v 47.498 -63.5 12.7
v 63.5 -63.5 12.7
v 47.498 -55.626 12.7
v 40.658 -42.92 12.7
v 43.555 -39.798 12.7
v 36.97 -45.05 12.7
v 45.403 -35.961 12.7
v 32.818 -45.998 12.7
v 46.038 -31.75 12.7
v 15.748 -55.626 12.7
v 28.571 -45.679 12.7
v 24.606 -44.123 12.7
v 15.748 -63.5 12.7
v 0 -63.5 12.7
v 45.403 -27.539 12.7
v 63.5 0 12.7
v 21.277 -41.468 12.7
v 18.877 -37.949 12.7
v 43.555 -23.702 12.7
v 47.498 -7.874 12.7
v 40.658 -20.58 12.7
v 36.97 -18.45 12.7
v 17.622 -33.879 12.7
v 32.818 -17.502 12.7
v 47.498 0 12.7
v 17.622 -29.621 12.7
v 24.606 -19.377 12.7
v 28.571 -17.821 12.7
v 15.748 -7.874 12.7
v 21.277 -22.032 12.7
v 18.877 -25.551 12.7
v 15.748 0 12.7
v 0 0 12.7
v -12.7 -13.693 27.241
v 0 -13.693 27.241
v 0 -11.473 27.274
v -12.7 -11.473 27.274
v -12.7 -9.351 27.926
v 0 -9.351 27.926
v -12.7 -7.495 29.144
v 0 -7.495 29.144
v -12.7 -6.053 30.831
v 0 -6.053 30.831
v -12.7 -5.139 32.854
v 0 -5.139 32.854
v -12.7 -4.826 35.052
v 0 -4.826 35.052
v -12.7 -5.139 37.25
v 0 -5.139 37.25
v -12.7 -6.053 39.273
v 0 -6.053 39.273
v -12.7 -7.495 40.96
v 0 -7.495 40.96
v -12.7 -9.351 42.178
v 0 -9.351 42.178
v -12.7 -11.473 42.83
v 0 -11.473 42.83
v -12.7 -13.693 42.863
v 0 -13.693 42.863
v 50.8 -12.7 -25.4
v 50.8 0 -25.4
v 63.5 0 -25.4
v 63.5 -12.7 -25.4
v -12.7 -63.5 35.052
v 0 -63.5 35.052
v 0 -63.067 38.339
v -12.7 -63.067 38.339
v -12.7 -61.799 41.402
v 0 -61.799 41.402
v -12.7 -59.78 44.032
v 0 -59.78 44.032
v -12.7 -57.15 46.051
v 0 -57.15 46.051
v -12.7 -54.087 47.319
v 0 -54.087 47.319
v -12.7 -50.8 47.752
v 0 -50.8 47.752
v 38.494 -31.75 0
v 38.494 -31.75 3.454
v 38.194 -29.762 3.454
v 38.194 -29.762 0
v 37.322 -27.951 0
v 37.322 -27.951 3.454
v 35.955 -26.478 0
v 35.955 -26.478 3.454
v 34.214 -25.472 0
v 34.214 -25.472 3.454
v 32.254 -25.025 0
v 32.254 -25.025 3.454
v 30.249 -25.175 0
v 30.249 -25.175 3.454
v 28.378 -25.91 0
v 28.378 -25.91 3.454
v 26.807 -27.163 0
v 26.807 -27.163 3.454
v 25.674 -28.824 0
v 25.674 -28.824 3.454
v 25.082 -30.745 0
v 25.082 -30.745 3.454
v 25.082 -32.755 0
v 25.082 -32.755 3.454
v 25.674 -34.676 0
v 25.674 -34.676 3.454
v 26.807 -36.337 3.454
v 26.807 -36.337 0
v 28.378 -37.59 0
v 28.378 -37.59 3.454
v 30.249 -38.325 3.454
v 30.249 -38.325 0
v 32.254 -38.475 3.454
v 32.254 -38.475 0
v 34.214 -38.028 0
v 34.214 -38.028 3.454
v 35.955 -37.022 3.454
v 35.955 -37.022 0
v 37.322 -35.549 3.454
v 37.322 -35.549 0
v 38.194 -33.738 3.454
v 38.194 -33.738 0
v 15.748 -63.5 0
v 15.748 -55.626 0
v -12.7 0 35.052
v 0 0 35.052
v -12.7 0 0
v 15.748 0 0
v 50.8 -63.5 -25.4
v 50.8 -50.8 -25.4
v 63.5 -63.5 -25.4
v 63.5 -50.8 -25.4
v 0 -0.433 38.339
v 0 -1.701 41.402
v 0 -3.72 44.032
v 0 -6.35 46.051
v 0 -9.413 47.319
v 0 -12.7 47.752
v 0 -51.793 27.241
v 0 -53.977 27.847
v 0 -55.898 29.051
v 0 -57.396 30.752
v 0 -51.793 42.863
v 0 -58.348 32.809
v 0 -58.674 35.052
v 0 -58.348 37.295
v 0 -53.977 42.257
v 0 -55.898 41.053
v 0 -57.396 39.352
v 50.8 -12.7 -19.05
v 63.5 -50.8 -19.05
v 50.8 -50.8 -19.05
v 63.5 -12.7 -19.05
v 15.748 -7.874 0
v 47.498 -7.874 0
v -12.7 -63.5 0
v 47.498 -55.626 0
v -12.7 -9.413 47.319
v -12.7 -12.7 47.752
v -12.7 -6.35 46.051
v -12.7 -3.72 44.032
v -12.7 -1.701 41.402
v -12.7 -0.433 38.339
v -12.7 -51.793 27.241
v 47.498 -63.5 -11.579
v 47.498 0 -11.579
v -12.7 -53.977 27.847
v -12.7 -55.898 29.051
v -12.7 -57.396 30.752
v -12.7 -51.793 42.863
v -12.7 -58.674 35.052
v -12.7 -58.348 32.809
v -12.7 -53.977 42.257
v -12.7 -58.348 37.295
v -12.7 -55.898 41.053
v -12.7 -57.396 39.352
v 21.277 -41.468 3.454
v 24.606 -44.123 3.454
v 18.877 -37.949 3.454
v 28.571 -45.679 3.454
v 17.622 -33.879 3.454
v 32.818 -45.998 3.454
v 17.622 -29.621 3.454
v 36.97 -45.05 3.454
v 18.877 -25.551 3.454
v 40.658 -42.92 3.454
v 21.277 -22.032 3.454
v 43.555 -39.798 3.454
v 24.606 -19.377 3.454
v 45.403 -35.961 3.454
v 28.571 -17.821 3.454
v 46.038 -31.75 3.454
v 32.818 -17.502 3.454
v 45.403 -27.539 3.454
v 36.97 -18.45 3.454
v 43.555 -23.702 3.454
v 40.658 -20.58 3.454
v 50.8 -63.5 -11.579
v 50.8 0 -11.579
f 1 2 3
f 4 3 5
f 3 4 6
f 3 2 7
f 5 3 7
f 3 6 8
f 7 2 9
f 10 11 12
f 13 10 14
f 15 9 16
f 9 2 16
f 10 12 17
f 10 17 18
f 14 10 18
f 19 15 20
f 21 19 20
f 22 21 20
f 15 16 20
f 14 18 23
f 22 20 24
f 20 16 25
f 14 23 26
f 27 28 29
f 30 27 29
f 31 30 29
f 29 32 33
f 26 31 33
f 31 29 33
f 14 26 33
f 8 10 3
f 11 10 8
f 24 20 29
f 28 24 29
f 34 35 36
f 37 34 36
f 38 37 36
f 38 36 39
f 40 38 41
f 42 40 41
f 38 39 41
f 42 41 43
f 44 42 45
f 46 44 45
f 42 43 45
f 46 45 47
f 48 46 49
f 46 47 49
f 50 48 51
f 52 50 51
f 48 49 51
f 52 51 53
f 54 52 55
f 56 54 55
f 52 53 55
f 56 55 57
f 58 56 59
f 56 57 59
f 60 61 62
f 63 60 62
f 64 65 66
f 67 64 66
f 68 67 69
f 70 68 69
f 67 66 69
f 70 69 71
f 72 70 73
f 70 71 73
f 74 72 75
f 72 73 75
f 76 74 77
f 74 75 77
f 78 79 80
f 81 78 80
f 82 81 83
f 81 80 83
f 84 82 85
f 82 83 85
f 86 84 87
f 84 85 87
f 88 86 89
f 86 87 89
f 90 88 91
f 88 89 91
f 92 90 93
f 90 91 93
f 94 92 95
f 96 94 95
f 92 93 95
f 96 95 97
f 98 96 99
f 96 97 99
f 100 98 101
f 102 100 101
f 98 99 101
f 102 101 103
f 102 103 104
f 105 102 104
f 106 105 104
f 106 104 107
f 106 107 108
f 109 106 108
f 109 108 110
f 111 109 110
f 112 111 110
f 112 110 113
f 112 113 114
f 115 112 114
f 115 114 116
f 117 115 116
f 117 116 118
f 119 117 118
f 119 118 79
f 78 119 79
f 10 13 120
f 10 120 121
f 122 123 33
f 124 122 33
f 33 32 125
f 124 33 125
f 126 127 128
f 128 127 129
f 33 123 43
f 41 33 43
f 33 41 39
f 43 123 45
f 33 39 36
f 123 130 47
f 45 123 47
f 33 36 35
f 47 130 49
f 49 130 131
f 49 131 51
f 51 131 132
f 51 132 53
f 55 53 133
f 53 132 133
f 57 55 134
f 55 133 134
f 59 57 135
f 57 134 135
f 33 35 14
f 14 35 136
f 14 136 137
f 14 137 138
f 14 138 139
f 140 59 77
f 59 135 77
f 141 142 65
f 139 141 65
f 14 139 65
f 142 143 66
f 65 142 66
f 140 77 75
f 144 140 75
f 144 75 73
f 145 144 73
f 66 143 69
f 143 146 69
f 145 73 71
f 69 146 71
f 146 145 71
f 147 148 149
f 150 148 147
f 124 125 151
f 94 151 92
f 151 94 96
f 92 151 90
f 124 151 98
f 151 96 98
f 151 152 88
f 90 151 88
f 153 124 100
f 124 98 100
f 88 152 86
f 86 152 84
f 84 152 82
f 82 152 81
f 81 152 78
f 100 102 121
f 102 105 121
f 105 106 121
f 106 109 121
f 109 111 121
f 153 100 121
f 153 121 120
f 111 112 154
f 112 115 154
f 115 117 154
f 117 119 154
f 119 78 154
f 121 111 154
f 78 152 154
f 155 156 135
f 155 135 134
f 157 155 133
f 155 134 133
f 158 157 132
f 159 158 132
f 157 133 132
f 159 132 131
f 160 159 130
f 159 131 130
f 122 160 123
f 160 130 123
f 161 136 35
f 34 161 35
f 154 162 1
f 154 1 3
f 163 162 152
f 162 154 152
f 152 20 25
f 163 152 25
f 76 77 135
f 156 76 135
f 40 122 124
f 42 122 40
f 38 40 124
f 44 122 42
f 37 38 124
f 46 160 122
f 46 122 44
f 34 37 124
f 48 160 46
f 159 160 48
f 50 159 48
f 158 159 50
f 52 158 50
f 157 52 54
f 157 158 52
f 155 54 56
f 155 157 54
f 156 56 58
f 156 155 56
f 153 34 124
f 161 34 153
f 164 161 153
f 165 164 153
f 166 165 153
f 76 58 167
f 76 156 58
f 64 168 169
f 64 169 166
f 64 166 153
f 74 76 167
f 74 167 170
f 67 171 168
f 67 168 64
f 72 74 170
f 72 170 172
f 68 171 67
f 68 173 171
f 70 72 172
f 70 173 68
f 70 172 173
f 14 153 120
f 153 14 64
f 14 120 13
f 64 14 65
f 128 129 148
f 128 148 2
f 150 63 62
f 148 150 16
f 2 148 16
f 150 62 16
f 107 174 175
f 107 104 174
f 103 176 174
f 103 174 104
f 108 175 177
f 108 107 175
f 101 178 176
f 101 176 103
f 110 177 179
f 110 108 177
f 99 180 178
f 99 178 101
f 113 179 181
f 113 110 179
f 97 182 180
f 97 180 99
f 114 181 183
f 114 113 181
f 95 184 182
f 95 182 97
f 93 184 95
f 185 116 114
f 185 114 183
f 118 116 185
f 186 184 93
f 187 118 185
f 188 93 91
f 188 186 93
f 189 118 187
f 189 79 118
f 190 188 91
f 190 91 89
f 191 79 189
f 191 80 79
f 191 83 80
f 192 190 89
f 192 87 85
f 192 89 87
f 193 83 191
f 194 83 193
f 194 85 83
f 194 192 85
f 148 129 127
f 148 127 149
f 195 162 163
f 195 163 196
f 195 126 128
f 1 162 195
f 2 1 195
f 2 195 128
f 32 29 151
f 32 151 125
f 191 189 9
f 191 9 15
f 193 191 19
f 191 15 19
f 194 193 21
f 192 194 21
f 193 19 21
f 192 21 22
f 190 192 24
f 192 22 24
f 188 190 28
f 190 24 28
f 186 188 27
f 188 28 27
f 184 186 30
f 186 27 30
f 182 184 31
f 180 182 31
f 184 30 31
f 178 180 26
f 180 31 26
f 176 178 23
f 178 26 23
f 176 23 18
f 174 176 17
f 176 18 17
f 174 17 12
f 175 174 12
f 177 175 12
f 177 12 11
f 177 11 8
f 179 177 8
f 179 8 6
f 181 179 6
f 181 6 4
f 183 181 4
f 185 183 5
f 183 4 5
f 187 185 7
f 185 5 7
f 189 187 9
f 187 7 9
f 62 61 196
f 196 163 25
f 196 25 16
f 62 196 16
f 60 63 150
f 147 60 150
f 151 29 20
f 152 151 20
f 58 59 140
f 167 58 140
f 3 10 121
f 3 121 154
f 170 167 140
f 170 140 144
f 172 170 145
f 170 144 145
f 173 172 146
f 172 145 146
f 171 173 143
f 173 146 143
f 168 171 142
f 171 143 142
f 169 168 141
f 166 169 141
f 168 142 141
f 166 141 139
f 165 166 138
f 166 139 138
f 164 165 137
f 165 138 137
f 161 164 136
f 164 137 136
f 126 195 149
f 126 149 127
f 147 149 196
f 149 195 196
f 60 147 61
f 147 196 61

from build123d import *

# Parameters (mm, degrees)
F1_DEPTH = 63.5
F2_W     = 38.1
F2_H     = 6.35
F3_DEPTH = 63.501
F4_W     = 31.75
F4_H     = 7.874
F5_DEPTH = 38.101
F4_R     = 14.2875
F4_R_2   = 6.7437
F6_DEPTH = 9.2456
F7_DEPTH = 38.101
F8_W     = 63.5
F8_H     = 12.7
F9_DEPTH = 12.7


with BuildPart() as f1:
    # F0 (on Front) → F1 (new body)
    with BuildSketch(Plane.XZ):
        Polygon((0, 12.7), (0, 0), (47.498, 0), (47.498, -11.579418), (50.8, -11.579418), (50.8, -25.4), (63.5, -25.4), (63.5, 12.7), (47.498, 12.7), align=None)
    extrude(amount=F1_DEPTH)

    # F2 (on face) → F3 (cut, through all)
    with BuildSketch(Plane.YZ.offset(63.5)):
        with Locations((-31.75, -22.225)):
            Rectangle(F2_W, F2_H)
    extrude(amount=-F3_DEPTH, mode=Mode.SUBTRACT)

    # F4 (on face) → F5 (cut, through all)
    with BuildSketch(Plane.XY.offset(12.7)):
        with Locations((31.623, -3.937)):
            Rectangle(F4_W, F4_H)
        with Locations((31.623, -59.563)):
            Rectangle(F4_W, F4_H)
    extrude(amount=-F5_DEPTH, mode=Mode.SUBTRACT)

    # F4 (on face) → F6 (cut)
    with BuildSketch(Plane.XY.offset(12.7)):
        with Locations((31.75, -31.75)):
            Circle(F4_R)
        with Locations((31.75, -31.75)):
            Circle(F4_R_2, mode=Mode.SUBTRACT)
    extrude(amount=-F6_DEPTH, mode=Mode.SUBTRACT)

    # F4 (on face) → F7 (cut, through all)
    with BuildSketch(Plane.XY.offset(12.7)):
        with Locations((31.75, -31.75)):
            Circle(F4_R_2)
    extrude(amount=-F7_DEPTH, mode=Mode.SUBTRACT)

    # F8 (on face) → F9 (join)
    with BuildSketch(Plane(origin=(0, 0, 0), x_dir=(0, -1, 0), z_dir=(-1, 0, 0))):
        with BuildLine():
            Line((0, 35.052), (0, 12.7))
            Line((0, 12.7), (63.5, 12.7))
            Line((63.5, 12.7), (63.5, 35.052))
            ThreePointArc((63.5, 35.052), (59.780256, 44.032256), (50.8, 47.752))
            Line((50.8, 47.752), (12.7, 47.752))
            ThreePointArc((12.7, 47.752), (3.719744, 44.032256), (0, 35.052))
        make_face()
        with BuildLine():
            Line((13.693089, 42.863124), (51.793089, 42.863124))
            ThreePointArc((51.793089, 42.863124), (58.674, 35.052), (51.793089, 27.240876))
            Line((51.793089, 27.240876), (13.693089, 27.240876))
            ThreePointArc((13.693089, 27.240876), (4.826, 35.052), (13.693089, 42.863124))
        make_face(mode=Mode.SUBTRACT)
        with Locations((31.75, 6.35)):
            Rectangle(F8_W, F8_H)
    extrude(amount=F9_DEPTH)


solid = f1.part
